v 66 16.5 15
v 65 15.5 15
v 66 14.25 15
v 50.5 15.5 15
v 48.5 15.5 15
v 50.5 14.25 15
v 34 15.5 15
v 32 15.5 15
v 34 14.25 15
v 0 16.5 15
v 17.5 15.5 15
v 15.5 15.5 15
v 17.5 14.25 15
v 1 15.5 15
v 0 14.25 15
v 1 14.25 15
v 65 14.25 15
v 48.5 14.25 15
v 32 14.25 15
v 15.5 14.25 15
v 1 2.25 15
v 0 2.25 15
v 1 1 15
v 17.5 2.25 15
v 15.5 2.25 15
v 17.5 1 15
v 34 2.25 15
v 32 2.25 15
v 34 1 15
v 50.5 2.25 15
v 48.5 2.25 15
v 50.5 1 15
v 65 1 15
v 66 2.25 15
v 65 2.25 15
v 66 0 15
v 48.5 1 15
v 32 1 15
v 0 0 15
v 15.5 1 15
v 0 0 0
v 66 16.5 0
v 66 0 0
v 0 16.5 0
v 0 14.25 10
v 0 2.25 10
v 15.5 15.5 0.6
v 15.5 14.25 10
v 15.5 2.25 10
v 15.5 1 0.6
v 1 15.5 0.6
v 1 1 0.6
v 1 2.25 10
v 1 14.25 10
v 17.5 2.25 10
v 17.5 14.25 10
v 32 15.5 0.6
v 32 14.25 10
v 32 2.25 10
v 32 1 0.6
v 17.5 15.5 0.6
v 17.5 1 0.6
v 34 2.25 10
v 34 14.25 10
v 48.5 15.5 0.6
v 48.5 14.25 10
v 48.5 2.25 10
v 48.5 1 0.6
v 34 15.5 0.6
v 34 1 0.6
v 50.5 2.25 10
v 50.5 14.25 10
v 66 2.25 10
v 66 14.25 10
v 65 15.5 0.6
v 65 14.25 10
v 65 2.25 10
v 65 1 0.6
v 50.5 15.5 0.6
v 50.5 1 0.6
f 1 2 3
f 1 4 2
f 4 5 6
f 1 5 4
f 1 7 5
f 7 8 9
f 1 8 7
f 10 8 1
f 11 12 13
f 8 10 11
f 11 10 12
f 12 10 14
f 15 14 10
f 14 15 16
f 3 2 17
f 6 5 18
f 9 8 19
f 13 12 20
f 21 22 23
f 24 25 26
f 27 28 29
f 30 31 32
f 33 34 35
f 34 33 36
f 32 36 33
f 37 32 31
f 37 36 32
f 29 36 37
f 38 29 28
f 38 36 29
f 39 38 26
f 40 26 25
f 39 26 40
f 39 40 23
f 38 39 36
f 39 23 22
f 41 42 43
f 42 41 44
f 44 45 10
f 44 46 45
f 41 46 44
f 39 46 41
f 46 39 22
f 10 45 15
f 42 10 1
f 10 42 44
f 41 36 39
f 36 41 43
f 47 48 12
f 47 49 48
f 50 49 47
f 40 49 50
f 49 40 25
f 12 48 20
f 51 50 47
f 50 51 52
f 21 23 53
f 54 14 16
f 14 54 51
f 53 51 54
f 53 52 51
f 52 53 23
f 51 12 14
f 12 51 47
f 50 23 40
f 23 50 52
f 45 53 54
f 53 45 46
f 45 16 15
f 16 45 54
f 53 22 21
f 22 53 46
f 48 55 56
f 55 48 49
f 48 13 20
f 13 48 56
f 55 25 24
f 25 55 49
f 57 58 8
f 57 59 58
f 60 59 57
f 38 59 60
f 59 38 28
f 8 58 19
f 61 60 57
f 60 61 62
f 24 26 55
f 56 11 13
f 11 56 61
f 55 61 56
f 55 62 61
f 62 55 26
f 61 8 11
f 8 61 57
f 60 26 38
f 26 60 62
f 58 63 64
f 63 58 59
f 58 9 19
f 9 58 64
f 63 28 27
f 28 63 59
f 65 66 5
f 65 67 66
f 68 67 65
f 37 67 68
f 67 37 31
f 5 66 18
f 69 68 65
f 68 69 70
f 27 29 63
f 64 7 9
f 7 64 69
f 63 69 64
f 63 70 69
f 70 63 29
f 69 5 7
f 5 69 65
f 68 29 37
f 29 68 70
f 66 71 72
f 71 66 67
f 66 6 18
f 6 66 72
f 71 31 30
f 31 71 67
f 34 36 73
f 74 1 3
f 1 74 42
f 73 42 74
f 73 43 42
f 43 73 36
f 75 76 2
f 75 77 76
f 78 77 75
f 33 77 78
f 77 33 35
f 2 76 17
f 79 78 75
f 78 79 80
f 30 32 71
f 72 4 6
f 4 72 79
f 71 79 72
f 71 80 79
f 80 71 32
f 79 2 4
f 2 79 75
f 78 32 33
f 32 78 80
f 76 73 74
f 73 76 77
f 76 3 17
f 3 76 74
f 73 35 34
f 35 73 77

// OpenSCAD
// length of the cube in mm tenth
length=165;
// height of the cube in mm tenth
height=150;

// hole width in mm tenth
holeWidth=120;

// hole height in mm tenth
holeHeight=50;

// how many rows to generate
rows=1;

// how many pixels to generate in a row
cols=4;

// thikness of the wall in mm tenth
wall=10;

// bottom thikness in mm tenth
bottomThikness=6;

// scale smaller so slicer sice is correct
scale(0.1) {
  for(j=[0:rows-1]) {  
    for(i=[0:cols-1]) {
      PixelCube(i*length,j*length);
    }
  }
}



module PixelCube(offsetRow,offSetCol) {
  translate([offsetRow,offSetCol,0]){
    difference() {
      cube([length,length,height]);
      // hollow the cube
      innerCubeLength=length-(wall*2);
      translate([wall,wall,bottomThikness]) {
        cube([innerCubeLength,innerCubeLength,height-bottomThikness]);
      }
  
      // add the hole on the left
      translate([0,(length-holeWidth)/2,height-holeHeight]) {
        cube([wall,holeWidth,holeHeight]);
      }
  
      // add the hole on the right
      translate([length-wall,(length-holeWidth)/2,height-holeHeight]) {
        cube([wall,holeWidth,holeHeight]);
      }
    }
  }
}
